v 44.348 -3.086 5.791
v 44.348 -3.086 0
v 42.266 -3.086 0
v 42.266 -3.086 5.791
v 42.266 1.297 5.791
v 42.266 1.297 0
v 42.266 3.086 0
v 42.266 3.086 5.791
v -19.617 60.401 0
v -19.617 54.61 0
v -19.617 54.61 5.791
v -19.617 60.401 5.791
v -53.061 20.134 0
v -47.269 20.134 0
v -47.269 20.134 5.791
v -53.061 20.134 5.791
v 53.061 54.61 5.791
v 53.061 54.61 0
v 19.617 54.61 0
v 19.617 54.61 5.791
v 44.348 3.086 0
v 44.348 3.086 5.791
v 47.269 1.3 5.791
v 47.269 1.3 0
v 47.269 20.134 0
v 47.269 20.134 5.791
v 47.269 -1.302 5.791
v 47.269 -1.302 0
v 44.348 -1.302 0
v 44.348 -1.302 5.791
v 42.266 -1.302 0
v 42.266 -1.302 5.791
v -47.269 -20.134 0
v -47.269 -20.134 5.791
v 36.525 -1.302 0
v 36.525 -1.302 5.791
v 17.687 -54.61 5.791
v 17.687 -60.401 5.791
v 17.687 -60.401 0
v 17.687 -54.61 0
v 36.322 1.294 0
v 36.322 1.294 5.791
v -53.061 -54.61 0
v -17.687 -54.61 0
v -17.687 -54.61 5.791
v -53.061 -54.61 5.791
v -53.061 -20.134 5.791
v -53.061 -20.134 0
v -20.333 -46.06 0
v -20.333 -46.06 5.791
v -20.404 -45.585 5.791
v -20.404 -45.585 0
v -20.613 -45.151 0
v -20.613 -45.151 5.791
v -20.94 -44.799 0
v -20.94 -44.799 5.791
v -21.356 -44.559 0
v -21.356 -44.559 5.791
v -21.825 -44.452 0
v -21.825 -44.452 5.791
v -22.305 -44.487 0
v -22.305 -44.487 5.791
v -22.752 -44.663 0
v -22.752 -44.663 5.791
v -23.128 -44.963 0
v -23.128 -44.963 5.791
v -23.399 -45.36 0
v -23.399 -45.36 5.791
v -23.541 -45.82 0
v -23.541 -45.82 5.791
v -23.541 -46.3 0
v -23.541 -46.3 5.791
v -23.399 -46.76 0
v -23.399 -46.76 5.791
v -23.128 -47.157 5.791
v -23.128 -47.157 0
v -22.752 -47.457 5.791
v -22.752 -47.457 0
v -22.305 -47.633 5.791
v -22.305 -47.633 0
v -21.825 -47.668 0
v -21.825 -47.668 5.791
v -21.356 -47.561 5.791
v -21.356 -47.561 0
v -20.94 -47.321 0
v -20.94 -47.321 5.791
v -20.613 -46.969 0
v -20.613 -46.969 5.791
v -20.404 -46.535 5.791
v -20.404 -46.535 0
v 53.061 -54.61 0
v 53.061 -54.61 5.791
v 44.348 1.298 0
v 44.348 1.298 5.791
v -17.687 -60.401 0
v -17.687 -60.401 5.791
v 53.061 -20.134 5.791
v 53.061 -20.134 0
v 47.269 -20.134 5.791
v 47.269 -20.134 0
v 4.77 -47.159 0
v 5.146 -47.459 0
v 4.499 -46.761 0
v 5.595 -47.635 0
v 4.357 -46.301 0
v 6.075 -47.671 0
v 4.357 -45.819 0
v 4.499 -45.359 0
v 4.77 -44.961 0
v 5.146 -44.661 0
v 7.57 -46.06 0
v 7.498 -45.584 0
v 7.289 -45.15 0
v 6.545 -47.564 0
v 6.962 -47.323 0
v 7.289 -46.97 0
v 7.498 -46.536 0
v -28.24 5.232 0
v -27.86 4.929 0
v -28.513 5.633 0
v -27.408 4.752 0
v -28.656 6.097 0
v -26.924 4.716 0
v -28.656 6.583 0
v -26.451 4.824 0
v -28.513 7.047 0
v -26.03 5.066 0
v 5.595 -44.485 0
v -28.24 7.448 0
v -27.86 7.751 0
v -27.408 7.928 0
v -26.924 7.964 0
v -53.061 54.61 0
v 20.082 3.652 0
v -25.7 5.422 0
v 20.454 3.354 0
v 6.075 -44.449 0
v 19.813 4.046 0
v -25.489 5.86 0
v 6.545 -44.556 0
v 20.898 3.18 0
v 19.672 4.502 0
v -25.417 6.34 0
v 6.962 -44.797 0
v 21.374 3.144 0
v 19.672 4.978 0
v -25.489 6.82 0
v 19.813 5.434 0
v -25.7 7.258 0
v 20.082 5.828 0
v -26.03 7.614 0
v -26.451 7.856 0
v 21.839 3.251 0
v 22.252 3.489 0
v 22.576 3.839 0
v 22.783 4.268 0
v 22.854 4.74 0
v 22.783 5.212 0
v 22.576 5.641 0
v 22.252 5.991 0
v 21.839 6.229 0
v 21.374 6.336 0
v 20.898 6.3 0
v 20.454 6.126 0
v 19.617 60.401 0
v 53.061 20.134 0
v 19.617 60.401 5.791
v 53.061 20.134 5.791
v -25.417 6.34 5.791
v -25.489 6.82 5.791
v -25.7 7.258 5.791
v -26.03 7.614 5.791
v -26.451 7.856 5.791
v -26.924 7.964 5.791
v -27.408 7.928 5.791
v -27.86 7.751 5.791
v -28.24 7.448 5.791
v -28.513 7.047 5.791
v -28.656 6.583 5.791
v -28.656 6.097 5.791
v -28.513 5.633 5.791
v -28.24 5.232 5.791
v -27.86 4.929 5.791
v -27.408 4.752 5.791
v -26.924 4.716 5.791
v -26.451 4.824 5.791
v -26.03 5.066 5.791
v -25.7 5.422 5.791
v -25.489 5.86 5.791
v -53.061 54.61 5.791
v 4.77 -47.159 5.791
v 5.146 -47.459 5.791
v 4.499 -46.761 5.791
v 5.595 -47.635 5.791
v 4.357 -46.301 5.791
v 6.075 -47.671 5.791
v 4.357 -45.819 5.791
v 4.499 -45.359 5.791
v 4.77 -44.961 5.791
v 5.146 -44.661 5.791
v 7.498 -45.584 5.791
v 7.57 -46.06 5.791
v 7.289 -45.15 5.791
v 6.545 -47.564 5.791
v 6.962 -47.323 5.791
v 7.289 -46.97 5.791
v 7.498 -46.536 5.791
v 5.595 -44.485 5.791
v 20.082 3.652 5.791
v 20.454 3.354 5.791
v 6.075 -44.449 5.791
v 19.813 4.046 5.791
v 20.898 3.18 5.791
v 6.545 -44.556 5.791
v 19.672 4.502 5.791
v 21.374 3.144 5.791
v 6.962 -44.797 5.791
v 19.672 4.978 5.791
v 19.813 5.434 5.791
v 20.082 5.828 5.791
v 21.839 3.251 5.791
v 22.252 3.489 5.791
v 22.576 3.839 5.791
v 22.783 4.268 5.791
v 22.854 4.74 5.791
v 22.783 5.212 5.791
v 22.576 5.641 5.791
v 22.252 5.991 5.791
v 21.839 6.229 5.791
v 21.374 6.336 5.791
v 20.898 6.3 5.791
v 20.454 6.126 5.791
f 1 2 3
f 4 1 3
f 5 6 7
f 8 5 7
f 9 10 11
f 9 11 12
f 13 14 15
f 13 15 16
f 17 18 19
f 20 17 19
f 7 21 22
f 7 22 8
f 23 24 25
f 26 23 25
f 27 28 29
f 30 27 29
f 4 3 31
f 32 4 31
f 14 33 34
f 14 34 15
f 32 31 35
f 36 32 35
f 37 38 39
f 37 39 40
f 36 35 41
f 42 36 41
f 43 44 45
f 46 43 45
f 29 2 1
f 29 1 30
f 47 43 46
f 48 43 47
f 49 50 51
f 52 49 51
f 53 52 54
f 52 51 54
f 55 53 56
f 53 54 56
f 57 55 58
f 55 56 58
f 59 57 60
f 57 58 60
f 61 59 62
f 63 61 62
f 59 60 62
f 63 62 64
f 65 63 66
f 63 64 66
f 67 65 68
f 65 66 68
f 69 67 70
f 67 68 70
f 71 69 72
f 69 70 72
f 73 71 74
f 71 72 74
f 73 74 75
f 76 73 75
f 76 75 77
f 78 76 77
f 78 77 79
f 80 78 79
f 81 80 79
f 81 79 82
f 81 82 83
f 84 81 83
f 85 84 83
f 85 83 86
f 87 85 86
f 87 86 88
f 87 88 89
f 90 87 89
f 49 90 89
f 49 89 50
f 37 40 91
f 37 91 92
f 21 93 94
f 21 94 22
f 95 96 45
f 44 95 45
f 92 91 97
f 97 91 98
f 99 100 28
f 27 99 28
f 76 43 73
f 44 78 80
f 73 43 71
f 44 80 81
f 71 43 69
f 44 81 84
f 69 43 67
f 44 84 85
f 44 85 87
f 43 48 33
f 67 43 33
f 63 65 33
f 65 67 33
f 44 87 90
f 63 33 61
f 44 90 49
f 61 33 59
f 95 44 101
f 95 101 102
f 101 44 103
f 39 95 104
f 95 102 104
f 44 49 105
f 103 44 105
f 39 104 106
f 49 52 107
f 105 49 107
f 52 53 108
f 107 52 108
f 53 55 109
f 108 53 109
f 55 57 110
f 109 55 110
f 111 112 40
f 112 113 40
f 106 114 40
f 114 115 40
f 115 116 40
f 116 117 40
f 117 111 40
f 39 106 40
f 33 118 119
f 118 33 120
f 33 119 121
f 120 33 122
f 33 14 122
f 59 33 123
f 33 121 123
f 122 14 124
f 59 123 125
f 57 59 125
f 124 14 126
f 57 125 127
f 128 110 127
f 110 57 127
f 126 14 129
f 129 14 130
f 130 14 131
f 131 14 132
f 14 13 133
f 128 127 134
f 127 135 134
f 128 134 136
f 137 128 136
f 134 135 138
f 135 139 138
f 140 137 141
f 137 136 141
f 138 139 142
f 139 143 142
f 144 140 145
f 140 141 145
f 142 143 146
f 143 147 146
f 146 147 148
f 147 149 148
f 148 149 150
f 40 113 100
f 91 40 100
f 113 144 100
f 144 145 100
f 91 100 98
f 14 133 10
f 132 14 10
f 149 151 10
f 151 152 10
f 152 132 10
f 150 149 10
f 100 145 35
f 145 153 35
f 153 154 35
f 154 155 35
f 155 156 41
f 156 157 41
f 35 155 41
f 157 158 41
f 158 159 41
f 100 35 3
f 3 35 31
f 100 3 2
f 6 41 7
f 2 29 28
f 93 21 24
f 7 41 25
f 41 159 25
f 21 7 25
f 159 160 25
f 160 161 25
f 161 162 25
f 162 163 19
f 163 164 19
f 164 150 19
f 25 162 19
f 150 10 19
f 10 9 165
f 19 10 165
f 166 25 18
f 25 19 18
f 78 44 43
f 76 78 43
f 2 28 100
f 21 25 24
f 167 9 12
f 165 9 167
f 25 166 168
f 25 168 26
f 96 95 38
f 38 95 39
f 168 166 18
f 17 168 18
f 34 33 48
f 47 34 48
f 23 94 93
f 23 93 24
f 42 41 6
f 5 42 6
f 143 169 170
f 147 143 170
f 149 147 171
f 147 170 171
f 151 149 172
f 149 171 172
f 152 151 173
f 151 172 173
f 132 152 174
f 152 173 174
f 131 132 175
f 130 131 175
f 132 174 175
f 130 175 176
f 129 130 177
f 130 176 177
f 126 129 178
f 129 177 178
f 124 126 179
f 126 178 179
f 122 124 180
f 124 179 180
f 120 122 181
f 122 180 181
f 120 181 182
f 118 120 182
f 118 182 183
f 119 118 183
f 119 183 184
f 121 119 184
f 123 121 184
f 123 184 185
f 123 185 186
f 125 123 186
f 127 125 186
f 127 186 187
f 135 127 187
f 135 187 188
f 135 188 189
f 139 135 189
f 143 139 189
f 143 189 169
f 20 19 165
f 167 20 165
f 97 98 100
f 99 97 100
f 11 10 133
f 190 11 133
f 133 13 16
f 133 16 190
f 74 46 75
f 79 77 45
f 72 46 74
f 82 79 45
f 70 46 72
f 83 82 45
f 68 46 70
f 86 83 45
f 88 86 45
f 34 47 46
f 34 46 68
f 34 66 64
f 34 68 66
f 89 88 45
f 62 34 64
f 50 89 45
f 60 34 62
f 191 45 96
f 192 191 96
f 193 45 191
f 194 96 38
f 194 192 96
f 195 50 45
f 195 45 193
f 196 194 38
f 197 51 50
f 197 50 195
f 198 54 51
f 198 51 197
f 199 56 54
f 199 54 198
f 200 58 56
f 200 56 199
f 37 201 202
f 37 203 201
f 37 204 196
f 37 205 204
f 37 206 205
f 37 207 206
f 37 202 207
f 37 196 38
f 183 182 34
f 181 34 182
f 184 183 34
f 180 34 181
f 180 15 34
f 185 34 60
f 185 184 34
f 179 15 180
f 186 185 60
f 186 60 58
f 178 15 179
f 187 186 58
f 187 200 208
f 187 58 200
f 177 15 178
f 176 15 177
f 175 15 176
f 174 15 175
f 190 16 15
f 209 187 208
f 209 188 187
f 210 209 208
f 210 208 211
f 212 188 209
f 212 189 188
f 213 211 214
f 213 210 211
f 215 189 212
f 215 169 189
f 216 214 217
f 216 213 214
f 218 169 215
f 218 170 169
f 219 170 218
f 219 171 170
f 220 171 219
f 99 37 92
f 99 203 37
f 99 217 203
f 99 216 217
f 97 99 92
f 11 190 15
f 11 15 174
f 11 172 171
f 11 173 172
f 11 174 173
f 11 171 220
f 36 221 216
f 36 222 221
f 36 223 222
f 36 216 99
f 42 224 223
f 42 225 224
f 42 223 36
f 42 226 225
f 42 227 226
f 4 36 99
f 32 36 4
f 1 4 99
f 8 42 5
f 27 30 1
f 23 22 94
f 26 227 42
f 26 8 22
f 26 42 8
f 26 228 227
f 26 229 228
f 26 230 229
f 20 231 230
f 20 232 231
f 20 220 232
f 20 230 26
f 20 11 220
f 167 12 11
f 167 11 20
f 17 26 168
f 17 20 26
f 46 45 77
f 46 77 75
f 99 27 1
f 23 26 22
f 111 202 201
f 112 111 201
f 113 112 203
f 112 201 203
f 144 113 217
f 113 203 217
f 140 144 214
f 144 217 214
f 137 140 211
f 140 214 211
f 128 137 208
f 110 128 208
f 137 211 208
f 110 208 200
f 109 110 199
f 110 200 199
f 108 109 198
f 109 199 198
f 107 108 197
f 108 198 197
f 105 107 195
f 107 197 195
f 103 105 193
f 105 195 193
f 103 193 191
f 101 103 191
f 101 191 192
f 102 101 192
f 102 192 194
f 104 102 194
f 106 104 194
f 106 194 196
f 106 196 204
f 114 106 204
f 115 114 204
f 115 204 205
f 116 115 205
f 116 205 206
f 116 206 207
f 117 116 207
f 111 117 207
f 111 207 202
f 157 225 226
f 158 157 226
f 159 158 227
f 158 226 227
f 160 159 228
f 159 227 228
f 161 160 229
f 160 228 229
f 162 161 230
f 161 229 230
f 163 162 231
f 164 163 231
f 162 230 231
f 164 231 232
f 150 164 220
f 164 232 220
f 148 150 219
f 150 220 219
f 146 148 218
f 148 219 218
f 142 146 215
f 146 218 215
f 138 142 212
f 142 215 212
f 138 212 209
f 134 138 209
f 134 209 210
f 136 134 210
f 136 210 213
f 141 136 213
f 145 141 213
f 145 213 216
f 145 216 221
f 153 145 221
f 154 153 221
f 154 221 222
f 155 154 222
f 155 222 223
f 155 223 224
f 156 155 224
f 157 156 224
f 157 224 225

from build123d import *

# Parameters (mm, degrees)
SKETCH1_W           = 106.1212
SKETCH1_H           = 120.8024
BOSS_EXTRUDE1_DEPTH = 5.7912
CAVITY2_START       = -53.0606
CAVITY2_OUTLINE_W   = 5.7912
CAVITY2_OUTLINE_H   = 5.7912
CAVITY2_DEPTH       = 35.373733333
CAVITY2_START_2     = 17.686866667
CAVITY2_2_OUTLINE_W = 5.7912
CAVITY2_2_OUTLINE_H = 5.7912
CAVITY2_2_DEPTH     = 35.373733333
SKETCH6_W           = 33.443333333
SKETCH6_H           = 5.7912
CUT_EXTRUDE4_DEPTH  = 81.605646398
SKETCH4_W           = 2.0828
SKETCH4_H           = 6.1722
CUT_EXTRUDE5_DEPTH  = 81.605646398
CUT_EXTRUDE6_DEPTH  = 81.605646398
SKETCH2_W           = 5.7912
SKETCH2_H           = 40.267466666
CUT_EXTRUDE7_DEPTH  = 81.605646398
SKETCH7_R           = 1.615828467
SKETCH7_R_2         = 1.628881449
SKETCH7_R_3         = 1.612957286
SKETCH7_R_4         = 1.6
CUT_EXTRUDE8_DEPTH  = 81.605646398


# Read off the part's stored shape, not the designer's step: Cavity2
with BuildPart() as part:
    # Sketch1 → Boss-Extrude1 (new body)
    with BuildSketch(Plane.XY):
        Rectangle(SKETCH1_W, SKETCH1_H)
    extrude(amount=BOSS_EXTRUDE1_DEPTH)

    # Cavity2 outline → Cavity2 (cut)
    with BuildSketch(Plane.YZ.offset(CAVITY2_START)):
        with Locations((-57.5056, 2.8956)):
            Rectangle(CAVITY2_OUTLINE_W, CAVITY2_OUTLINE_H)
    extrude(amount=CAVITY2_DEPTH, mode=Mode.SUBTRACT)

    # Cavity2 2 outline → Cavity2 2 (cut)
    with BuildSketch(Plane.YZ.offset(CAVITY2_START_2)):
        with Locations((-57.5056, 2.8956)):
            Rectangle(CAVITY2_2_OUTLINE_W, CAVITY2_2_OUTLINE_H)
    extrude(amount=CAVITY2_2_DEPTH, mode=Mode.SUBTRACT)

    # Sketch6 → Cut-Extrude4 (cut, through all)
    with BuildSketch(Plane(origin=(0, 0, 0), x_dir=(-1, 0, 0), z_dir=(0, 0, -1))):
        with Locations((-36.338933334, 57.5056)):
            Rectangle(SKETCH6_W, SKETCH6_H)
        with Locations((36.338933334, 57.5056)):
            Rectangle(SKETCH6_W, SKETCH6_H)
    extrude(amount=-CUT_EXTRUDE4_DEPTH, mode=Mode.SUBTRACT)

    # Sketch4 → Cut-Extrude5 (cut, through all)
    with BuildSketch(Plane(origin=(0, 0, 0), x_dir=(-1, 0, 0), z_dir=(0, 0, -1))):
        with Locations((-43.307, 0)):
            Rectangle(SKETCH4_W, SKETCH4_H)
    extrude(amount=-CUT_EXTRUDE5_DEPTH, mode=Mode.SUBTRACT)

    # Sketch3 → Cut-Extrude6 (cut, through all)
    with BuildSketch(Plane(origin=(0, 0, 0), x_dir=(-1, 0, 0), z_dir=(0, 0, -1))):
        Polygon((-50.0888, 1.30175), (-50.0888, -1.30175), (-36.5252, -1.30175), (-36.322002291, 1.29380831), align=None)
    extrude(amount=-CUT_EXTRUDE6_DEPTH, mode=Mode.SUBTRACT)

    # Sketch2 → Cut-Extrude7 (cut, through all)
    with BuildSketch(Plane(origin=(0, 0, 0), x_dir=(-1, 0, 0), z_dir=(0, 0, -1))):
        with Locations((-50.165, 0)):
            Rectangle(SKETCH2_W, SKETCH2_H)
        with Locations((50.165, 0)):
            Rectangle(SKETCH2_W, SKETCH2_H)
    extrude(amount=-CUT_EXTRUDE7_DEPTH, mode=Mode.SUBTRACT)

    # Sketch7 → Cut-Extrude8 (cut, through all)
    with BuildSketch(Plane.XY.offset(5.7912)):
        with Locations((5.9544, -46.06)):
            Circle(SKETCH7_R)
        with Locations((-27.0456, 6.34)):
            Circle(SKETCH7_R_2)
        with Locations((-21.9456, -46.06)):
            Circle(SKETCH7_R_3)
        with Locations((21.2544, 4.74)):
            Circle(SKETCH7_R_4)
    extrude(amount=-CUT_EXTRUDE8_DEPTH, mode=Mode.SUBTRACT)


solid = part.part
